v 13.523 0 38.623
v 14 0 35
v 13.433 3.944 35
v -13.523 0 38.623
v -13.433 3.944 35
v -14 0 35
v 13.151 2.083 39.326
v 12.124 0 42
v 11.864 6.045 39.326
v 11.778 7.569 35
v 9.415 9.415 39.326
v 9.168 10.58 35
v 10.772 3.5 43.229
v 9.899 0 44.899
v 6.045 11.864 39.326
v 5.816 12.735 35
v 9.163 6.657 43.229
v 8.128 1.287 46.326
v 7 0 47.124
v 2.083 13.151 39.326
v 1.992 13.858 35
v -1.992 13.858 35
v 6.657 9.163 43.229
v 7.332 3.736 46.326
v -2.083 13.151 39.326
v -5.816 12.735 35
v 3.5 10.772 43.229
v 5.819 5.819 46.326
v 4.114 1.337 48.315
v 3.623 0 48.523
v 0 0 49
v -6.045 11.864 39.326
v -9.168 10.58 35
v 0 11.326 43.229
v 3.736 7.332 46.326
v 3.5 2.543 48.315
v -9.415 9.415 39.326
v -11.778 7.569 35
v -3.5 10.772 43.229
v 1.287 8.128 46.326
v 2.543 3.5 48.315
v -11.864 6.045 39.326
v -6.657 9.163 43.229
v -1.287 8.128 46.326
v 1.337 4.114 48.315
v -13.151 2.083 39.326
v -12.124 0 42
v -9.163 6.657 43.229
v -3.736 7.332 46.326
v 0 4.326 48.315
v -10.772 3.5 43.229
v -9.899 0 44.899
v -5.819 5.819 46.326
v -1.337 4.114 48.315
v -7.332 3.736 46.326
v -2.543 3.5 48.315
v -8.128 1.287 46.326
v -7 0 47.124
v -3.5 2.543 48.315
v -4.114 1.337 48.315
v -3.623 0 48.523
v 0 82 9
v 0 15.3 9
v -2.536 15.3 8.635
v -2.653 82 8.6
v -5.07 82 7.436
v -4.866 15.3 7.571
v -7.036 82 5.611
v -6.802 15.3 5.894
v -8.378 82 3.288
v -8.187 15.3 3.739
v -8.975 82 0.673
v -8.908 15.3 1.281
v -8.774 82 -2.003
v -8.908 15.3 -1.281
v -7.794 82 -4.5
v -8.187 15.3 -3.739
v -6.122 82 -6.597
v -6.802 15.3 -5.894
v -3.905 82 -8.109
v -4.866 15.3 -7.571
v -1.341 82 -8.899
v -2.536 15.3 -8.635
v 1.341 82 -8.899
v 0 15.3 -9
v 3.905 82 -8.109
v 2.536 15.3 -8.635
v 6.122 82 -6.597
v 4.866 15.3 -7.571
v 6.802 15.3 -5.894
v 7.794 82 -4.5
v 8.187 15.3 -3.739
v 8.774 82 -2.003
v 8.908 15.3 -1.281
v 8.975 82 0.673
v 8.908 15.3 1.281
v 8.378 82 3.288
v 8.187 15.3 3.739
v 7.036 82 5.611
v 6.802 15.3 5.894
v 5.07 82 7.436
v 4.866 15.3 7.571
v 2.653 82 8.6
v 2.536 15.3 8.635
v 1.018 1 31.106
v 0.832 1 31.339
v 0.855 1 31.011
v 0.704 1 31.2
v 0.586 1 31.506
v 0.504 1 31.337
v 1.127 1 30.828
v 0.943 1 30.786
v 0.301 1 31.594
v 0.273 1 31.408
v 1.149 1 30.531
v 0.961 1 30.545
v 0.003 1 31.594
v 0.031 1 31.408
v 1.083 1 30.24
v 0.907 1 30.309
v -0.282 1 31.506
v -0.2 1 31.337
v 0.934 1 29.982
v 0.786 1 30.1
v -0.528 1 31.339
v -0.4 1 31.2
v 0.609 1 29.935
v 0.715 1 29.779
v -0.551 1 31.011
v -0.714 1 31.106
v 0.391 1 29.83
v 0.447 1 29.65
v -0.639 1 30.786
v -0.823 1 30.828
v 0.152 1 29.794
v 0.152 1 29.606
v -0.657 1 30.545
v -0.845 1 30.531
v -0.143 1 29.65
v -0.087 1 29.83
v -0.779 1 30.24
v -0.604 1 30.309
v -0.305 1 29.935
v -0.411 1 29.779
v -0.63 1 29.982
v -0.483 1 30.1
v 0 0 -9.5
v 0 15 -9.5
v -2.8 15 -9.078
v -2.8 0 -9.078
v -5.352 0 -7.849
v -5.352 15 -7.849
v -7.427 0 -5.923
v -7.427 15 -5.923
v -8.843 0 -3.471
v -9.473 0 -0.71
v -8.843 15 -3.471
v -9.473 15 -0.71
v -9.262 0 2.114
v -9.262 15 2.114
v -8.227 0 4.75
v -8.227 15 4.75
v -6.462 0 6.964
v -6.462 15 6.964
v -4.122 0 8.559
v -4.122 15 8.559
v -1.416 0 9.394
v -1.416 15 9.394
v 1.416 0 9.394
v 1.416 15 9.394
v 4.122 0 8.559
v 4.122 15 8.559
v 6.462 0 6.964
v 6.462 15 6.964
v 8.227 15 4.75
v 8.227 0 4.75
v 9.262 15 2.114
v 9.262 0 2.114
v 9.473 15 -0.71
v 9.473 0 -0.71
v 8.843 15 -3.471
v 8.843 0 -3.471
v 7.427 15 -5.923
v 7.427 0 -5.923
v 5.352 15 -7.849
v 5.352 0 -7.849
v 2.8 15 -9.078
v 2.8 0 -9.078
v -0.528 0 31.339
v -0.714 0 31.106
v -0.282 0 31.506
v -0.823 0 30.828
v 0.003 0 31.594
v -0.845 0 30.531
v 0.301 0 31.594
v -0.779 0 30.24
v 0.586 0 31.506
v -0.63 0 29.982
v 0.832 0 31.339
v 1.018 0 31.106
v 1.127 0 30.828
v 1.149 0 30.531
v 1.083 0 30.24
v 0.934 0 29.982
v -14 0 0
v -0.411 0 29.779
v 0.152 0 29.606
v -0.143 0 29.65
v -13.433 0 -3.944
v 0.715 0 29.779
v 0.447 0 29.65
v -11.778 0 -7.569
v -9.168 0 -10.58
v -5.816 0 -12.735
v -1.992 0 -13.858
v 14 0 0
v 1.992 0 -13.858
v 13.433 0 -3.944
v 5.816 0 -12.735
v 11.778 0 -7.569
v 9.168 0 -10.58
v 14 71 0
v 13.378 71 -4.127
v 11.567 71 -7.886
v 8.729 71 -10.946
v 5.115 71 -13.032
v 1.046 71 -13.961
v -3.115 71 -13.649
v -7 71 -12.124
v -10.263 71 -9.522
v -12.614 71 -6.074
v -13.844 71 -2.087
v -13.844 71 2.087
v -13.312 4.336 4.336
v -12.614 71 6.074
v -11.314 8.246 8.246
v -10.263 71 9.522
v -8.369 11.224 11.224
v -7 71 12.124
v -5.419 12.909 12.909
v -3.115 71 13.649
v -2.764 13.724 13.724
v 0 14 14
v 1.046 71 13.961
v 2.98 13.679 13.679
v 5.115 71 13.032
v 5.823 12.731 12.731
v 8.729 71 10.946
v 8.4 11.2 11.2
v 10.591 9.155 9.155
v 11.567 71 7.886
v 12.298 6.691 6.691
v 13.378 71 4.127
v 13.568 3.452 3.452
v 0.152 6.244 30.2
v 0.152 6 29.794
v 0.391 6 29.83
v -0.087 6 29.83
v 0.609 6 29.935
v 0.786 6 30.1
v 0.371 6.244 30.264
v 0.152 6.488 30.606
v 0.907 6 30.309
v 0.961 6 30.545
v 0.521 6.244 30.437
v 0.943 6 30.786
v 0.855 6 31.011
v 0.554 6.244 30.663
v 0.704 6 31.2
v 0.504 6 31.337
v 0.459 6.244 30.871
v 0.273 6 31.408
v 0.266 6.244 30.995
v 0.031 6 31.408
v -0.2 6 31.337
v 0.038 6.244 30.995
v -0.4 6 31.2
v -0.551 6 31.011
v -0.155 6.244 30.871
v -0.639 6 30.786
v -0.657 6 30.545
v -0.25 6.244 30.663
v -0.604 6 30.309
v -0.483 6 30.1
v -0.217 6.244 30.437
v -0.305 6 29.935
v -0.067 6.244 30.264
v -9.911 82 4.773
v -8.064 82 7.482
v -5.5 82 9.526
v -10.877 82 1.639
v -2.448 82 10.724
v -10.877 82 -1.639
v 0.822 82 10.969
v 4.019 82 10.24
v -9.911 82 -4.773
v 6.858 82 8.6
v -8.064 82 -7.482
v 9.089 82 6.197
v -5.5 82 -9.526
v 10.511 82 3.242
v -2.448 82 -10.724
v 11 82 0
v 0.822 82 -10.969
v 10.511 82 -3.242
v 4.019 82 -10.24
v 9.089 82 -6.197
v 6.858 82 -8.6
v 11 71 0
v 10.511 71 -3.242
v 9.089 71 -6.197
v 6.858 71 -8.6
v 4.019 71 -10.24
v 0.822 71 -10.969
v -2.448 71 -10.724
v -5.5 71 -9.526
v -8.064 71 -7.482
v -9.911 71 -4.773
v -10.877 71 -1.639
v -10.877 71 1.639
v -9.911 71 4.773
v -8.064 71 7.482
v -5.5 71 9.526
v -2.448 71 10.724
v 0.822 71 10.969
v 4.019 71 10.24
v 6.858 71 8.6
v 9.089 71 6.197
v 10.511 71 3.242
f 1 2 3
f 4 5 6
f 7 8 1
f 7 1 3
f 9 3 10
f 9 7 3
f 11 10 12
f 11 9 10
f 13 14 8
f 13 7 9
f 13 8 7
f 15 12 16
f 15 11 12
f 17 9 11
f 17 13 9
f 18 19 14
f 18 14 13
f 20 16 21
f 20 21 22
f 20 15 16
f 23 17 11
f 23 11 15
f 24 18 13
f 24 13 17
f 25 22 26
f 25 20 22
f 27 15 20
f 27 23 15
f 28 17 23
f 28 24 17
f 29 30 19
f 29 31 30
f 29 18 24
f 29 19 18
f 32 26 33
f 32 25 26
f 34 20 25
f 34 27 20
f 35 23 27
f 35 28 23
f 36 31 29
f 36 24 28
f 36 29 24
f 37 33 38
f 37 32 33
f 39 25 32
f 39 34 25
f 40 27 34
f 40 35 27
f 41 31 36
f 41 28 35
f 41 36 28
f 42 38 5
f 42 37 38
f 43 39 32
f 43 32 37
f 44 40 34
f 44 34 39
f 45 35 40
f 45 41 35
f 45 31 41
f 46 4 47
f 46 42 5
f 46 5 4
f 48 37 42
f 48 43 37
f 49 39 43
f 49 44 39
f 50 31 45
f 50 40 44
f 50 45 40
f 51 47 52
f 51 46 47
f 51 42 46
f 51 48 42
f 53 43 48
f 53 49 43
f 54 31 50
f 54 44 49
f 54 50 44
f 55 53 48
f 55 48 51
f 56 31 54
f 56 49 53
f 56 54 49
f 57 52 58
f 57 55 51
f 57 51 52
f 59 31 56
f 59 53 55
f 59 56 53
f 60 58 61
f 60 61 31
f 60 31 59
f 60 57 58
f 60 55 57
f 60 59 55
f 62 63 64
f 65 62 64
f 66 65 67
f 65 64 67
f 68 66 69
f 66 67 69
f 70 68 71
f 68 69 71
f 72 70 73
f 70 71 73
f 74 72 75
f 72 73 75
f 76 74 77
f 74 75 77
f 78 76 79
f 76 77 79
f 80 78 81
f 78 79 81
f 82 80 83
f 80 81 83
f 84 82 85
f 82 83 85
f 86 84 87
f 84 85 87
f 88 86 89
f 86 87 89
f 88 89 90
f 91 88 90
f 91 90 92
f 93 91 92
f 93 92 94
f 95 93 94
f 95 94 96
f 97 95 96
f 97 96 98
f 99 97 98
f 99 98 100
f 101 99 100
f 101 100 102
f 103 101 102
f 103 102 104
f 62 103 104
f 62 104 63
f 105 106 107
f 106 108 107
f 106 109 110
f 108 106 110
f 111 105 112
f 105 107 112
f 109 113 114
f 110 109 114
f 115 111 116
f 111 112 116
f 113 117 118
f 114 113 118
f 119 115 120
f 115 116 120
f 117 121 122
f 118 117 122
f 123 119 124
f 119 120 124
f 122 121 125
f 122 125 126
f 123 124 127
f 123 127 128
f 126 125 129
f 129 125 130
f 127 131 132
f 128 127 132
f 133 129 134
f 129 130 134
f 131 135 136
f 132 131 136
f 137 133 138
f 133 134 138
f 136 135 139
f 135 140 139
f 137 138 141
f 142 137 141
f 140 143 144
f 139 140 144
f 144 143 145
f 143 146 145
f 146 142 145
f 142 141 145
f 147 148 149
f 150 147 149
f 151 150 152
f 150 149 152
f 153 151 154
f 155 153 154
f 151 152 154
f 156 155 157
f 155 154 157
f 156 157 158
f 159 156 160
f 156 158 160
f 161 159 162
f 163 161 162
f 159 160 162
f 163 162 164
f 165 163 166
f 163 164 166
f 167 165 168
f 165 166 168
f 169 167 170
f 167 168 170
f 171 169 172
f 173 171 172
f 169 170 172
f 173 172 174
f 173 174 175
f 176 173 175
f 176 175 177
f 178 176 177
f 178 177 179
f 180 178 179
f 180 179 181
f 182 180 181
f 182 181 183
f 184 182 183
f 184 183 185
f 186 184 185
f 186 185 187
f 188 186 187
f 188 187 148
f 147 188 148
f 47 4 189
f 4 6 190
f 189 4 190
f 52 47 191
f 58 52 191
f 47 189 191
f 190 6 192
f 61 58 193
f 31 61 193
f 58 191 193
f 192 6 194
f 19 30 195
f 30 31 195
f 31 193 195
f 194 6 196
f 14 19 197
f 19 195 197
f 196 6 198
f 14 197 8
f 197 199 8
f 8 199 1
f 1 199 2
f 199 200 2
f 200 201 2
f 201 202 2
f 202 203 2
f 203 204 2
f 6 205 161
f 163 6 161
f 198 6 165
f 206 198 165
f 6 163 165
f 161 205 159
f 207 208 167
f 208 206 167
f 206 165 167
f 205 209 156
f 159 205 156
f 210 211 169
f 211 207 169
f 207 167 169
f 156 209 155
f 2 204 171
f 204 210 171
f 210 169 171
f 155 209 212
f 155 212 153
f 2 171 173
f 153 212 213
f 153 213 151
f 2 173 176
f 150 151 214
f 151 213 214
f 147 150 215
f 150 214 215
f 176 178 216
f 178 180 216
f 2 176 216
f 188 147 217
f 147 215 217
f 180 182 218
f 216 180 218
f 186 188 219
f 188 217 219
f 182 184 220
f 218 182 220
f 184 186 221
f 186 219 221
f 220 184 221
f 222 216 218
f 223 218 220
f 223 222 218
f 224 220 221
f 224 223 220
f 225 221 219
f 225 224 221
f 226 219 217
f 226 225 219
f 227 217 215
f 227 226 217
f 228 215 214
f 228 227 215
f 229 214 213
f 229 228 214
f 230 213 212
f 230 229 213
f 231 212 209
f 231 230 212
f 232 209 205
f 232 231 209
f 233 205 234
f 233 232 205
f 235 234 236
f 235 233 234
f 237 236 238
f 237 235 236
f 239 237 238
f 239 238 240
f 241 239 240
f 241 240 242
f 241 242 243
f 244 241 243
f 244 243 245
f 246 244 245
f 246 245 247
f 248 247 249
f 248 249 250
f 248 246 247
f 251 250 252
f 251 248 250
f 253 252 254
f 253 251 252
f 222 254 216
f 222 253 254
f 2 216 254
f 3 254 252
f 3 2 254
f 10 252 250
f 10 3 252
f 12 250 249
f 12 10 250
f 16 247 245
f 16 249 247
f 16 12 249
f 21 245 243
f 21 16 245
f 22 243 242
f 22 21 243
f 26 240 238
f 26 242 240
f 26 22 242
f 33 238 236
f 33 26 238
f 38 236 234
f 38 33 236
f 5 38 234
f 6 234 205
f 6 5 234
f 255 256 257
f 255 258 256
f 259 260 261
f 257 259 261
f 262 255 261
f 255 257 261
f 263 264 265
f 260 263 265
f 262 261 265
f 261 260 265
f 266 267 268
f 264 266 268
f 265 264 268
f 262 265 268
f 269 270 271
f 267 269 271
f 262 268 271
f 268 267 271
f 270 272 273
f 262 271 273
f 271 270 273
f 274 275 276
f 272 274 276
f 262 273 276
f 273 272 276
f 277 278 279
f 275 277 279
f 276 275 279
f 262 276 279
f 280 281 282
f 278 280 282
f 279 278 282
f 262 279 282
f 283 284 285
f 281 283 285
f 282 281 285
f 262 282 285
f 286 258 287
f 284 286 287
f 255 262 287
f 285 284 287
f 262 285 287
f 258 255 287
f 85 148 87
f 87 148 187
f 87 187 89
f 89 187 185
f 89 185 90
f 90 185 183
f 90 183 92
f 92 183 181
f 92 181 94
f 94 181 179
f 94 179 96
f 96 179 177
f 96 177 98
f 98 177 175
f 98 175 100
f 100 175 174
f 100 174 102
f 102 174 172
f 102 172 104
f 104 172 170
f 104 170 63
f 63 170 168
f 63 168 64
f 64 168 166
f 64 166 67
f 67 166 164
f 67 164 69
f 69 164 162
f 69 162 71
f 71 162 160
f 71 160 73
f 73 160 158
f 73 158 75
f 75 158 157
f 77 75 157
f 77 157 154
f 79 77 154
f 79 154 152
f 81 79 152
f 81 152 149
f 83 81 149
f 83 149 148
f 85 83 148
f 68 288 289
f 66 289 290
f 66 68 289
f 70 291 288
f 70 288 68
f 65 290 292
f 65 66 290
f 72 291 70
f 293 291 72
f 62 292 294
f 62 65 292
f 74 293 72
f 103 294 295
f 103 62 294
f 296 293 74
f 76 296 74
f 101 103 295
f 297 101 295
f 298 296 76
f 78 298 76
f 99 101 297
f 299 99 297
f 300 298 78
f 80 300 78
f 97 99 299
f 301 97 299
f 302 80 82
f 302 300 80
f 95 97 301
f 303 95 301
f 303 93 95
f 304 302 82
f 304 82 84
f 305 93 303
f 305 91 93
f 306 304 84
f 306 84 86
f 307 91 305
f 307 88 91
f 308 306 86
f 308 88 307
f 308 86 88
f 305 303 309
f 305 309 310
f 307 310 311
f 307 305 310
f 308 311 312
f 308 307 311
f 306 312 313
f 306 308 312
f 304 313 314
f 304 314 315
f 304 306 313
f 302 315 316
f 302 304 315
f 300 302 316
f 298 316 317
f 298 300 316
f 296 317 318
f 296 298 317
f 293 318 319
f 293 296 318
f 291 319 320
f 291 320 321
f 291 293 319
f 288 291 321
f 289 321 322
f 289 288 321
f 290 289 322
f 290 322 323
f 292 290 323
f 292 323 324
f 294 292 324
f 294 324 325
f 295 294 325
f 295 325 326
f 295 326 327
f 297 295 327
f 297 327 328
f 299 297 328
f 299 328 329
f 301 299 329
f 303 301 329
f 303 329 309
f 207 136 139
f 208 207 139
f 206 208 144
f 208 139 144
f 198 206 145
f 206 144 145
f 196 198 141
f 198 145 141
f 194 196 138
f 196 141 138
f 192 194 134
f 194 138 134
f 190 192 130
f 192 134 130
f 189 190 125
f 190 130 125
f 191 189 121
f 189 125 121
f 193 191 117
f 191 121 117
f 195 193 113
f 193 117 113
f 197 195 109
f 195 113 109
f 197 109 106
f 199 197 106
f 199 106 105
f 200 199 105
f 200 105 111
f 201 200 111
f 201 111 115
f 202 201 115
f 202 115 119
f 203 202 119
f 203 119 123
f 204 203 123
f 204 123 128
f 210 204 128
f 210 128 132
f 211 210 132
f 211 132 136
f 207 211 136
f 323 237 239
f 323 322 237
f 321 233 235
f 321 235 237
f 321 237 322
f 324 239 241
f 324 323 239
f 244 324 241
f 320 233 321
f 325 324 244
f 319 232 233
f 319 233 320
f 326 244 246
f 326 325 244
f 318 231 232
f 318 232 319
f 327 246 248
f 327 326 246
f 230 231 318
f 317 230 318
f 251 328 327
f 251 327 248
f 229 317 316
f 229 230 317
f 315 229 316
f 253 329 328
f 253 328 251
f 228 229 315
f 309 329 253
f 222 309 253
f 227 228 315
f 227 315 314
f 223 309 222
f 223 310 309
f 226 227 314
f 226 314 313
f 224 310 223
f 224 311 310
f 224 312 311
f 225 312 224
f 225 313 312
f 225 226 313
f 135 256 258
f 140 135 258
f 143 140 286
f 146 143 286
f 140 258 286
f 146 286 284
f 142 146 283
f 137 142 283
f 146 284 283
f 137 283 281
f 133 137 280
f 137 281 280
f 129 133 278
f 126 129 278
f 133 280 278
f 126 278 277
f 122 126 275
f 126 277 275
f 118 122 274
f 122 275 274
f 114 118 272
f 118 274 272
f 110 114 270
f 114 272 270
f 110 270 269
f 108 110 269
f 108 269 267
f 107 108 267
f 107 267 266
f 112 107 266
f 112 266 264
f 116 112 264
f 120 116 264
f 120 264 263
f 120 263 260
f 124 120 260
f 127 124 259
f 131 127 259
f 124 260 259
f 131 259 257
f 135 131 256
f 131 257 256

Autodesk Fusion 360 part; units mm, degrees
cylinder "CylinderPrimitive1" add diameter 28 height 71 placed x (1, 0, 0) y (0, 0, -1) z (0, 1, 0) at (0, 0, 0) makes body 1
cylinder "CylinderPrimitive2" add diameter 22 height 82 placed x (1, 0, 0) y (0, 0, -1) z (0, 1, 0) at (0, 0, 0) bodies 1
hole "Hole1" at (0, 82, 0) direction (0, -1, 0) diameter 18 end through all bodies 1 1
cylinder "CylinderPrimitive3" add diameter 28 height 35 placed x (1, 0, 0) y (0, 1, 0) z (0, 0, 1) at (0, 0, 0) bodies 1
box "BoxPrimitive1" add length 16 width 90 height 32 placed x (0, 1, 0) y (0, 0, 1) z (1, 0, 0) at (0, -16, -11) separate body makes body 2
move_body "Move1" bodies 2 to x (1, 0, 0) y (0, 1, 0) z (0, 0, 1) at (-16, 0, 0)
sphere "SpherePrimitive1" add diameter 28 placed x (1, 0, 0) y (0, 1, 0) z (0, 0, 1) at (0, 0, 35) bodies 1
combine "Combine1" operation cut target body 1 tool bodies 2
hole "Hole2" at (0, 0, 0) direction (0, 1, 0) diameter 19 depth 15 tip angle 118 bodies 1
hole "Hole3" at (0.1519, 0, 30.6055) direction (0, 1, 0) diameter 1.623 depth 6 tip angle 118 counterbore diameter 2 counterbore depth 1 bodies 1
